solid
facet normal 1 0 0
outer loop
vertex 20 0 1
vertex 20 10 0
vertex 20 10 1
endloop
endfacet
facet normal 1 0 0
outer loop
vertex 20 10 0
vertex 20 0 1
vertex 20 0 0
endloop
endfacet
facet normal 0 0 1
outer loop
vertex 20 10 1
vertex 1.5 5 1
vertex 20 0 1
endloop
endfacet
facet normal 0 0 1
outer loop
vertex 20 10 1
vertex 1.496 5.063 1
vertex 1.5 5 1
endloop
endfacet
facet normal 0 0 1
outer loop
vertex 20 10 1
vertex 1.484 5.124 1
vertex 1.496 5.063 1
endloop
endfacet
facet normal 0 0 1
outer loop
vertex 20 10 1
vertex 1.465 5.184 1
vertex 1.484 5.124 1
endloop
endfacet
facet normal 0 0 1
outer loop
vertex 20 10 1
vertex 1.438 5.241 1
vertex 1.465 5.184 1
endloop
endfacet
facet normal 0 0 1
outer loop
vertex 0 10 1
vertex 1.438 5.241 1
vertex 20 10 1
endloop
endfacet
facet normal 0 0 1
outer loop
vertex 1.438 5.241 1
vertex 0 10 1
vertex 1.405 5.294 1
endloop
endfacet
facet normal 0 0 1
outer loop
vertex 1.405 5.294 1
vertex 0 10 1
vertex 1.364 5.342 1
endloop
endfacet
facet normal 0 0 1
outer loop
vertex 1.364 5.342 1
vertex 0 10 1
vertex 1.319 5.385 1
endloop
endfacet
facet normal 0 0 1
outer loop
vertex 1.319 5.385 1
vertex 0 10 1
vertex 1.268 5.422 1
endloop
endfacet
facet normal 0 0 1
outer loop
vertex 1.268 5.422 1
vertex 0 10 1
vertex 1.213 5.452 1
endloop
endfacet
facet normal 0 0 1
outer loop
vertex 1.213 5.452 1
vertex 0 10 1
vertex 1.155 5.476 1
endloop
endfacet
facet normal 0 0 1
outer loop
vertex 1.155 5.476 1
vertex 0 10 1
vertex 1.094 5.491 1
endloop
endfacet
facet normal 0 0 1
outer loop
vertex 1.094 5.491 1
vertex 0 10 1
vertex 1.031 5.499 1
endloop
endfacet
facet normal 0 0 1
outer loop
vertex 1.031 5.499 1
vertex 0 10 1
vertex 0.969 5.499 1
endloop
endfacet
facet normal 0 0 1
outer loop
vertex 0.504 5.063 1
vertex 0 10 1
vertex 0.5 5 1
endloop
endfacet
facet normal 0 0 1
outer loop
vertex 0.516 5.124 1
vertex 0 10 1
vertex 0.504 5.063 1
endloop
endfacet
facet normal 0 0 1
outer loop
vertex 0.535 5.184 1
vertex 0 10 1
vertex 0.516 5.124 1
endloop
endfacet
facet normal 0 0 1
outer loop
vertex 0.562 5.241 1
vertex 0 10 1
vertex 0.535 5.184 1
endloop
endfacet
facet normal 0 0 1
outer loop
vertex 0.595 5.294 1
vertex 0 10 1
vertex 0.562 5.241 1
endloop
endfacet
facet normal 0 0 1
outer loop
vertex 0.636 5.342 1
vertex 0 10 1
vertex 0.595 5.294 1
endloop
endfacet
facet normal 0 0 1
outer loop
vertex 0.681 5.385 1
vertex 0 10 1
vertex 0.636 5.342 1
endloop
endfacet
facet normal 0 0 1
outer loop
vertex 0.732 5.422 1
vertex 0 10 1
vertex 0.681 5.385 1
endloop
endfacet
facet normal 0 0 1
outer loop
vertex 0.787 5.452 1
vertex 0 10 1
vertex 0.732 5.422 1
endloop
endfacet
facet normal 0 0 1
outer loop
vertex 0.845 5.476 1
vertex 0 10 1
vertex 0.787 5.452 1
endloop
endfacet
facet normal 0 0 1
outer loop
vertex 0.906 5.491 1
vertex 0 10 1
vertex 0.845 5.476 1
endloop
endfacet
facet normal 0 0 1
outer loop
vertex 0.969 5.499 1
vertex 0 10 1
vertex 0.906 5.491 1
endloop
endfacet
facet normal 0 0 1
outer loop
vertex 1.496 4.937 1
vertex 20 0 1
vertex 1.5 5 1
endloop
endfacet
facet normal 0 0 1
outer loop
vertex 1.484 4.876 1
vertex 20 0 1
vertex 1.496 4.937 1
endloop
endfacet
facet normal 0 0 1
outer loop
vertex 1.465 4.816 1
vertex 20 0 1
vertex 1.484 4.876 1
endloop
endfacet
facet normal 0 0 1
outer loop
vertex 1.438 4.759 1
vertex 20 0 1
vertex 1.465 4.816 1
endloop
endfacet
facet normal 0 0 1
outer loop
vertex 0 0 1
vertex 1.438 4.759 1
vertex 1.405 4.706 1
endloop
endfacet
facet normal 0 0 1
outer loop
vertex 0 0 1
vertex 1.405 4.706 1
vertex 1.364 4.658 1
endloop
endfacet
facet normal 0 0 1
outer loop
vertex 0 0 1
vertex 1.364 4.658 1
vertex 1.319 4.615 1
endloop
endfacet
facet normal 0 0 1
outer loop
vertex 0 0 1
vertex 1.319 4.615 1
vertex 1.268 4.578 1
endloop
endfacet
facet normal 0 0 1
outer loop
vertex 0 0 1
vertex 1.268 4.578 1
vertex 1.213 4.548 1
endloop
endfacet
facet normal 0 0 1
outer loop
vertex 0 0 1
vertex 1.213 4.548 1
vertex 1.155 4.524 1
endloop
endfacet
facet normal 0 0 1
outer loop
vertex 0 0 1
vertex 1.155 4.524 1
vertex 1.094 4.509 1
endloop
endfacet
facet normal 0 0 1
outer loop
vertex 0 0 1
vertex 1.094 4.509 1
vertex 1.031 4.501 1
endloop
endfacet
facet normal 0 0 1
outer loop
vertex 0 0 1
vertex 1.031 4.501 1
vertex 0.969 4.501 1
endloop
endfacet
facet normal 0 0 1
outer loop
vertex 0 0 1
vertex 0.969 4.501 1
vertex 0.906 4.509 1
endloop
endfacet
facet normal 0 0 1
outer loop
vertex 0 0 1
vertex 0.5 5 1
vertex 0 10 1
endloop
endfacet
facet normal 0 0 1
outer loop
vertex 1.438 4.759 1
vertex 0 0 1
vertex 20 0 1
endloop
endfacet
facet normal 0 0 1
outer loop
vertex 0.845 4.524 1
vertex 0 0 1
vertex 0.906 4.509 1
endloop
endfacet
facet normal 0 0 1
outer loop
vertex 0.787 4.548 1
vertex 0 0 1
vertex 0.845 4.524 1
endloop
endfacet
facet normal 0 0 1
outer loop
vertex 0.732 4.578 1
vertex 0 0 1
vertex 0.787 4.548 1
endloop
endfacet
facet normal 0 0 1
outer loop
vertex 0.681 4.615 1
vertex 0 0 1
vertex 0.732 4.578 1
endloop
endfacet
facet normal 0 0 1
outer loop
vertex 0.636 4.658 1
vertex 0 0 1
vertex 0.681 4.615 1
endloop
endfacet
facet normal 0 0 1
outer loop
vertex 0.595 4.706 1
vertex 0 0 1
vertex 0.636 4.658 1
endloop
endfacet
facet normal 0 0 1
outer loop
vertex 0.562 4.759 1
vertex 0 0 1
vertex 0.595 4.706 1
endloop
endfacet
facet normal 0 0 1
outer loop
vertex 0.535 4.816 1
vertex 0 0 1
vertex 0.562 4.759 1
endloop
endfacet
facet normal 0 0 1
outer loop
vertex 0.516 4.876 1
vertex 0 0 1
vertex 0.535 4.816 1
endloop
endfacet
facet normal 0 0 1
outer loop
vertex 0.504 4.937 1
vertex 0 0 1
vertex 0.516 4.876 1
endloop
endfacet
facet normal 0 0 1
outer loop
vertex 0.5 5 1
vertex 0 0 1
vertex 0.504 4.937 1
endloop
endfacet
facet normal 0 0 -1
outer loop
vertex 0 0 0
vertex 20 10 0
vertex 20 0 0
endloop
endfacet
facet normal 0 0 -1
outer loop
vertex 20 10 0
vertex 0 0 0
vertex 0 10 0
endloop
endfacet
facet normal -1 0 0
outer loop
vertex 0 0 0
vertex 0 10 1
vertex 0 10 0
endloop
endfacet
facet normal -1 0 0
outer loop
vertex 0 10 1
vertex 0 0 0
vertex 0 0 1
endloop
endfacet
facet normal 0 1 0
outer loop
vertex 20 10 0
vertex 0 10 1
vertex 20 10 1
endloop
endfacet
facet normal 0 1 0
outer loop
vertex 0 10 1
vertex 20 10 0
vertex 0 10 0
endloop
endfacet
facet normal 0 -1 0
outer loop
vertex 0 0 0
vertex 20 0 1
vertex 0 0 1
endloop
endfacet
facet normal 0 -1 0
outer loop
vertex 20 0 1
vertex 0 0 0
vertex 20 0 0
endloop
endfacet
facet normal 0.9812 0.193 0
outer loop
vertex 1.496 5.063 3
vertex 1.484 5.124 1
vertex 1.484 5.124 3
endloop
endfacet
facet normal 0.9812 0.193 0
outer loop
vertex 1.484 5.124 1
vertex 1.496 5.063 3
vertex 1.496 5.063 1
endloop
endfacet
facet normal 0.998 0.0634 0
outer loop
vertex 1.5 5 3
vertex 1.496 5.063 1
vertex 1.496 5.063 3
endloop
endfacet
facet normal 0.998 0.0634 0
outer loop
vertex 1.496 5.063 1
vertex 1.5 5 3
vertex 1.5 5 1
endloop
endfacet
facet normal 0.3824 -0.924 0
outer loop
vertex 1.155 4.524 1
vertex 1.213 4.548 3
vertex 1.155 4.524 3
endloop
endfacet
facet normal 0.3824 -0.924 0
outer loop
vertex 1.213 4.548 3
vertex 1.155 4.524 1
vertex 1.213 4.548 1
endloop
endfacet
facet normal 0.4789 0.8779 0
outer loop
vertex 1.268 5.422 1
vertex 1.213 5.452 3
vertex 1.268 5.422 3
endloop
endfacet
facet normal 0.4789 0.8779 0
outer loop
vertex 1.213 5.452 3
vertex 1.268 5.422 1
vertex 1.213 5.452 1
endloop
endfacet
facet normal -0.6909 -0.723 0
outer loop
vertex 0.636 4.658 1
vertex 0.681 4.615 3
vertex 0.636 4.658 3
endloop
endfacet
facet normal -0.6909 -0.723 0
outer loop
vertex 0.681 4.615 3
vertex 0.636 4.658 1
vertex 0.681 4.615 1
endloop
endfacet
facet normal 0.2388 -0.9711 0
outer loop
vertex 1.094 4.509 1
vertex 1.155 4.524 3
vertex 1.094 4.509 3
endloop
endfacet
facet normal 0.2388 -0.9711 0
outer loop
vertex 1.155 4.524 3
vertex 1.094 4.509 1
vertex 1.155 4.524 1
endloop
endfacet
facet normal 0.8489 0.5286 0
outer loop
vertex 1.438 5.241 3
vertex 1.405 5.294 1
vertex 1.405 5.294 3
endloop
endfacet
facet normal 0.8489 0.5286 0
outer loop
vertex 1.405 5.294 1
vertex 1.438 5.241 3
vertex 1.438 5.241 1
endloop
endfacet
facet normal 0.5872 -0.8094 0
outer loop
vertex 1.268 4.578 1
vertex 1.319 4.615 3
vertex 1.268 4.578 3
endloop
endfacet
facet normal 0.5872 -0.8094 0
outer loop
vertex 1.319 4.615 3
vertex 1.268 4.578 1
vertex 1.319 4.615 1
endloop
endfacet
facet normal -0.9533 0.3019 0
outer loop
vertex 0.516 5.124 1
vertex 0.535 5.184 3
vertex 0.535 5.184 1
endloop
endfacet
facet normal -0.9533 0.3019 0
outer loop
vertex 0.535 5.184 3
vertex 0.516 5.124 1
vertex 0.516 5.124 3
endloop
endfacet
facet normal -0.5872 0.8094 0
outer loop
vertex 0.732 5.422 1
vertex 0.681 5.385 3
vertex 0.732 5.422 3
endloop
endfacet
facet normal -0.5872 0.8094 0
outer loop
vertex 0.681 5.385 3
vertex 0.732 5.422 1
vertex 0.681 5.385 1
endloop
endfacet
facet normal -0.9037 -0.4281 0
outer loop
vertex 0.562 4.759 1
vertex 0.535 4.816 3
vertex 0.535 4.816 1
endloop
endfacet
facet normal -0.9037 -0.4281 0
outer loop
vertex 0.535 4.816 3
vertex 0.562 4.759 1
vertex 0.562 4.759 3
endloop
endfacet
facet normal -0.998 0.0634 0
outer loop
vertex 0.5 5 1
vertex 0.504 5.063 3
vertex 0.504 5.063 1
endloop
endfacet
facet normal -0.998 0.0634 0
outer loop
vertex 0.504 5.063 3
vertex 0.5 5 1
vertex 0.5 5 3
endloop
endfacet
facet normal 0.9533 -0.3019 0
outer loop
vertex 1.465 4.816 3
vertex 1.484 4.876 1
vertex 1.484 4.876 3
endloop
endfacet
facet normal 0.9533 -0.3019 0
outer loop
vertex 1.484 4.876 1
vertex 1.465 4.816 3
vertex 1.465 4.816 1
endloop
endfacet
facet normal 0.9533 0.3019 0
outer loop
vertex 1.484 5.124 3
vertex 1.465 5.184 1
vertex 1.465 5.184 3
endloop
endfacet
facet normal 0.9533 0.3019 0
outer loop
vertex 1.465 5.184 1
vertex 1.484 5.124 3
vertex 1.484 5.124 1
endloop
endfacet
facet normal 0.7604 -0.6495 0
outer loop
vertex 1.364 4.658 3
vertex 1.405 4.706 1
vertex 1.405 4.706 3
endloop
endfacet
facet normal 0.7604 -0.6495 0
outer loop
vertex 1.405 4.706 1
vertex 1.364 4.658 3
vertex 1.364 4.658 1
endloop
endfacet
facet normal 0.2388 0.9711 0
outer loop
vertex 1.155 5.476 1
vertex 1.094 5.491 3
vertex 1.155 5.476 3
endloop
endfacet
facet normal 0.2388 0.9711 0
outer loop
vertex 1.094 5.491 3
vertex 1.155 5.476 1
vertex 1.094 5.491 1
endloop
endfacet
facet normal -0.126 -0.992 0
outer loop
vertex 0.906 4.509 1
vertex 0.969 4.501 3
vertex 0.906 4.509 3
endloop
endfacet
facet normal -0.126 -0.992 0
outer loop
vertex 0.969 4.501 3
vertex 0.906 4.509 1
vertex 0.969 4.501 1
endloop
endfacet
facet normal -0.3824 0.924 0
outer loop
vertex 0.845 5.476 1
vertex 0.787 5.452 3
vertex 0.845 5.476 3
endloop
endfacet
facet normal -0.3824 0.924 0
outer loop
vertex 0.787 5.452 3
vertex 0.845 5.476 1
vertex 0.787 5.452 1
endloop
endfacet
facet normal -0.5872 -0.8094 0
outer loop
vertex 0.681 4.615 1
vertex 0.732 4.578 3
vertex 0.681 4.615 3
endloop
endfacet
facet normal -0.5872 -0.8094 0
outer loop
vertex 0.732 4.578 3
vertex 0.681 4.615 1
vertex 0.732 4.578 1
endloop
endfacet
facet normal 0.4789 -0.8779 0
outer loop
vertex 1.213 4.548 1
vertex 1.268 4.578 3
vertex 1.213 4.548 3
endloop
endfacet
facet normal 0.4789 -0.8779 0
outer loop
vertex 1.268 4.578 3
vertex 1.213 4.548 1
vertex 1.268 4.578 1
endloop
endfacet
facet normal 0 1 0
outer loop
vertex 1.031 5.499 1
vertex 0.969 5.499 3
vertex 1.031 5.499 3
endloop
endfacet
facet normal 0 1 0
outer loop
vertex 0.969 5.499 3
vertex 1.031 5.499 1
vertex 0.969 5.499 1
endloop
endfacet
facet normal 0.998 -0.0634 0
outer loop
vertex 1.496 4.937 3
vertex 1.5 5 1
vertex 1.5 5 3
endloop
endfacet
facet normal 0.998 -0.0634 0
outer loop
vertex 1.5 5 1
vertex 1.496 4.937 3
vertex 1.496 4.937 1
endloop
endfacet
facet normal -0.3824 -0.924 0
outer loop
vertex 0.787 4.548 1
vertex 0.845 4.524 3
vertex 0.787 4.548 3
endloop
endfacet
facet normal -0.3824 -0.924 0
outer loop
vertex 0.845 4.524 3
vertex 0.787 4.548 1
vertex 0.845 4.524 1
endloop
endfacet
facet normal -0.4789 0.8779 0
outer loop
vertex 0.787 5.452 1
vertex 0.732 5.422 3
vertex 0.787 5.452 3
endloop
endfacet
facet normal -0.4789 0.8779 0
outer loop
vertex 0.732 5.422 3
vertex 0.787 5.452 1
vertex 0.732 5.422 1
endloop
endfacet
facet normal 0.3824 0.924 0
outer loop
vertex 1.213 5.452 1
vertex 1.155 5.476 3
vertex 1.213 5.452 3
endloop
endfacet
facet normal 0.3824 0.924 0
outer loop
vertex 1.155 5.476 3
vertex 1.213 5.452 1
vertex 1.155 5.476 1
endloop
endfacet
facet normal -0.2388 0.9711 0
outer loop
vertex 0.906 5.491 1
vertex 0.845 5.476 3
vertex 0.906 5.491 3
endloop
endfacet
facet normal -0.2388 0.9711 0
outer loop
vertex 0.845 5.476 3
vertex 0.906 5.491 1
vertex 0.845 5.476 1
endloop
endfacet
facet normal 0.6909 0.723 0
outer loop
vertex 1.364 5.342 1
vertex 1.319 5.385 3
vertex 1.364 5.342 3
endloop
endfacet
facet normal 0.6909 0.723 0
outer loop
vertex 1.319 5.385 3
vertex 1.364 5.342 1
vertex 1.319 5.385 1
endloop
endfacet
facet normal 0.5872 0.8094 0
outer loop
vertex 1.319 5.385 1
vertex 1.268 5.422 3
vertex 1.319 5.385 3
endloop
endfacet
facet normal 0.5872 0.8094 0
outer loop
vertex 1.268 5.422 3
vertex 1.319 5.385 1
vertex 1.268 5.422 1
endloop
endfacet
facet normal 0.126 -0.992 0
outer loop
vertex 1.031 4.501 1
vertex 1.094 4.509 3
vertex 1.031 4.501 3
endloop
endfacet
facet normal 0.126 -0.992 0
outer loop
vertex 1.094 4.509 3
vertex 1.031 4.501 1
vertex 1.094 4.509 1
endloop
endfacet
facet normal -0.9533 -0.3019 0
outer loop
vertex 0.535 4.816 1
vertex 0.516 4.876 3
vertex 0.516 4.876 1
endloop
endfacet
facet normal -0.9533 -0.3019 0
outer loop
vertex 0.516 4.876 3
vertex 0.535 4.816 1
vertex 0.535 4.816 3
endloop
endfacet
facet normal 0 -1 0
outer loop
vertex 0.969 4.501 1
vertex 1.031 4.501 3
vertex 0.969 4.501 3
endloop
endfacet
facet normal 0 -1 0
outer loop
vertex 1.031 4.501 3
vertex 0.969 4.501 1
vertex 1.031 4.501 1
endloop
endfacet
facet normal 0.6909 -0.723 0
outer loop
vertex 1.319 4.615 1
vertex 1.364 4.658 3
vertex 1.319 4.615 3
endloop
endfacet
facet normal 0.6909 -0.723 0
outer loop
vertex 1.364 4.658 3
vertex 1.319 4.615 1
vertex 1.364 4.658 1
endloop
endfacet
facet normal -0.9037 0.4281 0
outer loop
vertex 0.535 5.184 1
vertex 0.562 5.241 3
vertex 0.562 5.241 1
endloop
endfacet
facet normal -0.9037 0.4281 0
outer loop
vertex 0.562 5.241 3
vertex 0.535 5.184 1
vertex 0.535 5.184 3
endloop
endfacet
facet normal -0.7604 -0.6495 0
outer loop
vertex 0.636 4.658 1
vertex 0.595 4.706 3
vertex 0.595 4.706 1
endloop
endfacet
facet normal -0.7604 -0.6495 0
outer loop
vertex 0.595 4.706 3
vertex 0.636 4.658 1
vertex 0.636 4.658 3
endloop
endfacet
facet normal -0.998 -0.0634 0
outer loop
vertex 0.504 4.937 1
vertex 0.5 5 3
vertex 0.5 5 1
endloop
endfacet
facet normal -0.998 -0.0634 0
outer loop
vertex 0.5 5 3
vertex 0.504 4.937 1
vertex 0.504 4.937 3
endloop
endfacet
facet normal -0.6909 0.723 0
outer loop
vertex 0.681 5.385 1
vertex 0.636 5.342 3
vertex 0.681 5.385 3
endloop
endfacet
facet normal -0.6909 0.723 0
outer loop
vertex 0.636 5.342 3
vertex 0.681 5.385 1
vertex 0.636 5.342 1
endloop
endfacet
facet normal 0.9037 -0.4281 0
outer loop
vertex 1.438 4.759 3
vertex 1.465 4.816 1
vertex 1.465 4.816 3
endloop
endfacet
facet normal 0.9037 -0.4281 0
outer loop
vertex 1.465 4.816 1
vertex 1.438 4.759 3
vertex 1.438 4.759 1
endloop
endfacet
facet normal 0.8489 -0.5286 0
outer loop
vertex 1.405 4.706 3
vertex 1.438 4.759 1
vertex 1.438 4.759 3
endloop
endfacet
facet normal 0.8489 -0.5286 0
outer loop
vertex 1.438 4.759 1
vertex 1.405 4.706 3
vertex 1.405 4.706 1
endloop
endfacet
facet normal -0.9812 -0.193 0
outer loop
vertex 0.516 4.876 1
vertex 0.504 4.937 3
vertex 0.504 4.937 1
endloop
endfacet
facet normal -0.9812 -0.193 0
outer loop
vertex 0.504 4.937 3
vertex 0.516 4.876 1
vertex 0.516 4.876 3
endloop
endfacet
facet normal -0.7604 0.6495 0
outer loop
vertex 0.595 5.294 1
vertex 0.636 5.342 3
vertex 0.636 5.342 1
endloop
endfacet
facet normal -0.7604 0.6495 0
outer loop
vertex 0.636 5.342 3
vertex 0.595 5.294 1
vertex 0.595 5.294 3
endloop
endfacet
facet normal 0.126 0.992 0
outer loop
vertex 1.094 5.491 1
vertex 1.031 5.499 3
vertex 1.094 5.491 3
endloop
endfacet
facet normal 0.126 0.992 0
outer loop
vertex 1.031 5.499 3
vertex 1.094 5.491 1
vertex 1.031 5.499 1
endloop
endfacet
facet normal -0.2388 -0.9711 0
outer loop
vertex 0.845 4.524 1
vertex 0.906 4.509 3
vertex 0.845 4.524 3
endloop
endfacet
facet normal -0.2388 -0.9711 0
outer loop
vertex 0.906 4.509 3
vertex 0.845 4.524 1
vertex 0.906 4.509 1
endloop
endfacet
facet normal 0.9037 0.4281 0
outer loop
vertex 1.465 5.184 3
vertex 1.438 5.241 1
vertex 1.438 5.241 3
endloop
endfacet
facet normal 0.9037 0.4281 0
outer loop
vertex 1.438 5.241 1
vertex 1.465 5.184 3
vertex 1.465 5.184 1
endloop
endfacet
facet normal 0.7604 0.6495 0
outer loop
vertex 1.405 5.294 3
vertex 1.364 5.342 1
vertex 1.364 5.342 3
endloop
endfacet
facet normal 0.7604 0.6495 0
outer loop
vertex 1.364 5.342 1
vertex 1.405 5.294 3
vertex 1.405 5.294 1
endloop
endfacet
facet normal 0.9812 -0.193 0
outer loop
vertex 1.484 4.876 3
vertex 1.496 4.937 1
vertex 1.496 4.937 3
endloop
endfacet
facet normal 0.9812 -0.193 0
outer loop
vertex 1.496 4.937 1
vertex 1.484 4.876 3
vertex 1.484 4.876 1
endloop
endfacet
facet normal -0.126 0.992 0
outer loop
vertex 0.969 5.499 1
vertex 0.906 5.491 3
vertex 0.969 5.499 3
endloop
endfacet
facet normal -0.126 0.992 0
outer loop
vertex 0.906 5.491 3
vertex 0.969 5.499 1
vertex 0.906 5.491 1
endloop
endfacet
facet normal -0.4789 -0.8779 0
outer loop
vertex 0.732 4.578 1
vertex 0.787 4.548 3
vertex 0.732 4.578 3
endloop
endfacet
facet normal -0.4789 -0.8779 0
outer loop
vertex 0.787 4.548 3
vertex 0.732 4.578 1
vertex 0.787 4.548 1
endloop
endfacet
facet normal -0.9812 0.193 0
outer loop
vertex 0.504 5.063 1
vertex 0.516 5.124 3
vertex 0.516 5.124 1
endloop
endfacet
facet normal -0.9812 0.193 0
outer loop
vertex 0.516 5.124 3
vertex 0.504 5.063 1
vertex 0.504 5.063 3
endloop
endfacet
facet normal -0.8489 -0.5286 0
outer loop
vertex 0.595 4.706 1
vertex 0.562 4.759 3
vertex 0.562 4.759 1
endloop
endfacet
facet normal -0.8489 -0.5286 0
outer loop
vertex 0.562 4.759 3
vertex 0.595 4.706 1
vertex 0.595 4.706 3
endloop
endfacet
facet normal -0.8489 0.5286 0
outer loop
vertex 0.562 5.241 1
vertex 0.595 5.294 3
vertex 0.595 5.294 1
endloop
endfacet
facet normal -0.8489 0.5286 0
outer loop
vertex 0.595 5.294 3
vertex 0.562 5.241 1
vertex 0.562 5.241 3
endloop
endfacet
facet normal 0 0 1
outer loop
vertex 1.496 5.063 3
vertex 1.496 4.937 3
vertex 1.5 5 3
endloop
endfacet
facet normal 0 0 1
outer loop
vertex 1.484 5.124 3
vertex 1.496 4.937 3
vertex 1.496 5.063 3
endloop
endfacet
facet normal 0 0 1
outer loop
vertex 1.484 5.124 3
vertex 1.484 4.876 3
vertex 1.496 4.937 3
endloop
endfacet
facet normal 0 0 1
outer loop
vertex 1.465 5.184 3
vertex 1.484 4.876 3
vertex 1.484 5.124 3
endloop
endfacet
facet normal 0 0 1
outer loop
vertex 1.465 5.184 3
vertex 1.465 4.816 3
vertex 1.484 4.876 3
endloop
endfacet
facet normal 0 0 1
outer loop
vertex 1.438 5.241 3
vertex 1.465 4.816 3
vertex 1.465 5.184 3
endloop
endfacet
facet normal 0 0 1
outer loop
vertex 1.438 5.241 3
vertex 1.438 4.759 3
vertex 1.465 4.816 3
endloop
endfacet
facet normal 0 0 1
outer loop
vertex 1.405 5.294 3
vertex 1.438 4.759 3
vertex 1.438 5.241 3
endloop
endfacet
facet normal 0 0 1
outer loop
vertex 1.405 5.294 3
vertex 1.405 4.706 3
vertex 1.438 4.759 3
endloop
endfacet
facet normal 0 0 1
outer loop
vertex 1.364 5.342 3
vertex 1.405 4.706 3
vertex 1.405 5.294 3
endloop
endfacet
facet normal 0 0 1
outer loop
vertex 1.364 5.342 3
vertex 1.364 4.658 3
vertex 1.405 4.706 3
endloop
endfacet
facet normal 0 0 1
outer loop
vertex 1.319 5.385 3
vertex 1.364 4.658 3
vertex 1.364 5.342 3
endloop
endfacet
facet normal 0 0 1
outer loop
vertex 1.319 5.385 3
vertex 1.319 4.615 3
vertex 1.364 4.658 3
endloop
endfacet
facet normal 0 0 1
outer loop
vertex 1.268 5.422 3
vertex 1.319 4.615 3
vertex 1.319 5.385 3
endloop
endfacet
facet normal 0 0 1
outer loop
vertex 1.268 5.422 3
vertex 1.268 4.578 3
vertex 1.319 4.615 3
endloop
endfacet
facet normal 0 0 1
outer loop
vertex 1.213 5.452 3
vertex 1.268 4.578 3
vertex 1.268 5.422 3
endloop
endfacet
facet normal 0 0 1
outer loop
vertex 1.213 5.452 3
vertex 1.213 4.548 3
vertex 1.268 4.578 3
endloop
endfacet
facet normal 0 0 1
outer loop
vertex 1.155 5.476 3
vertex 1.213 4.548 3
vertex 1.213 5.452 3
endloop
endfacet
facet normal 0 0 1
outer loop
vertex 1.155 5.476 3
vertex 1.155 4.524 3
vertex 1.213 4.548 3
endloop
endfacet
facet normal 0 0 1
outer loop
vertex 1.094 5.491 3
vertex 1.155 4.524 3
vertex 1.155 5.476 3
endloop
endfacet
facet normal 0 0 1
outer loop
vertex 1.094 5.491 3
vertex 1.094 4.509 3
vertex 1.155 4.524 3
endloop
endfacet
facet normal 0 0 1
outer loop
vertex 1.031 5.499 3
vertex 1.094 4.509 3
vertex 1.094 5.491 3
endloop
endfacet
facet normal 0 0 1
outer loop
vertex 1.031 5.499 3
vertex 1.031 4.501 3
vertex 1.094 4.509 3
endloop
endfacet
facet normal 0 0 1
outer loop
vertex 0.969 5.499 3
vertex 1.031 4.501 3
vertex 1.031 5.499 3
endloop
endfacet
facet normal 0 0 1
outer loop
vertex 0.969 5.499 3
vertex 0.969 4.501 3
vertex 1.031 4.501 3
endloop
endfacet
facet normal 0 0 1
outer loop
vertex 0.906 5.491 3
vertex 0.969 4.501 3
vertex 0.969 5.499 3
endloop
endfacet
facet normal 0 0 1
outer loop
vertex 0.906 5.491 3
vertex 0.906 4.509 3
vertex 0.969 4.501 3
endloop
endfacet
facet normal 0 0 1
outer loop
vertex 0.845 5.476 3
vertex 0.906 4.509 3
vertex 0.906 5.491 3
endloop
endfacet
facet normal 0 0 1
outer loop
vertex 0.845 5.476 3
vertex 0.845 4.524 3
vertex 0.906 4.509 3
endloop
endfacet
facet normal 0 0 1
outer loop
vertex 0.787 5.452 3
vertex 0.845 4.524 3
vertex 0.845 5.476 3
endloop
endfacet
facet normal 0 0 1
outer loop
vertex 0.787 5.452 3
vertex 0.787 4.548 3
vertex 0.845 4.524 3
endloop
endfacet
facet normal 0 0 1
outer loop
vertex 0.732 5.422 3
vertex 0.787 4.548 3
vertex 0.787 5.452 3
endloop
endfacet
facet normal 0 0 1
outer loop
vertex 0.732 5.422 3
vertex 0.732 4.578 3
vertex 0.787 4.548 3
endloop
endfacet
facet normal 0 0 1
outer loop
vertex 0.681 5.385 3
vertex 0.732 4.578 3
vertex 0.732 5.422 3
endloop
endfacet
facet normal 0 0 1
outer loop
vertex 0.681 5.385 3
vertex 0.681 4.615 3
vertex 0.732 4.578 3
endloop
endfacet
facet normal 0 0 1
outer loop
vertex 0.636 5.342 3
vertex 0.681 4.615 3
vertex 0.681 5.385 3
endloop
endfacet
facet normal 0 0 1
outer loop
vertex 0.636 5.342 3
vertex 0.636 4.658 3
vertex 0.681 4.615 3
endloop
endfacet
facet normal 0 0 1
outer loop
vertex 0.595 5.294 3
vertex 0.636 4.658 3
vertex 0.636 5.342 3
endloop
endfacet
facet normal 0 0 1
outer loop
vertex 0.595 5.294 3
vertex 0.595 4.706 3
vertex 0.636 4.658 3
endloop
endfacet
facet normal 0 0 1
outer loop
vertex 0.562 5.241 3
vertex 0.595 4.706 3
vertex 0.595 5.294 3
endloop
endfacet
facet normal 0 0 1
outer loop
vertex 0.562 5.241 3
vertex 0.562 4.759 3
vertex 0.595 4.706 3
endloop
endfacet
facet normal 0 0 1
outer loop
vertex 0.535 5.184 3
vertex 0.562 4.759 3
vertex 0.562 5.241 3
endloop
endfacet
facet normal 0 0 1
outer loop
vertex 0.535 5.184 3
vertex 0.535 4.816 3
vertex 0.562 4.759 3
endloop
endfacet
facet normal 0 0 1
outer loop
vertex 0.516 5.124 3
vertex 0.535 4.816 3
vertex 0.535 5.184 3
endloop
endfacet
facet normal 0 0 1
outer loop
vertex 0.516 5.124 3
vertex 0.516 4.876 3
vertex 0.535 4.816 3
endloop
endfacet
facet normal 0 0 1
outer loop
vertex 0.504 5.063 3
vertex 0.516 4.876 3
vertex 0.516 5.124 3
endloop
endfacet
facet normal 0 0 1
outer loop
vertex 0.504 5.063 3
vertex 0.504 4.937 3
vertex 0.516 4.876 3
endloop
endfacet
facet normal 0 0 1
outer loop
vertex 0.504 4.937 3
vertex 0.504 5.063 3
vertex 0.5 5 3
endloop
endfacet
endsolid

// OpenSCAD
module base()
{
	cube([20, 10, 1]);
	translate([1,5,1])
		cylinder(r=0.5, h=2, $fn=50);
}

module sway(){
	difference(){
		cylinder(r=1, h=1, $fn=50);
		cylinder(r=0.7, h=2, $fn=50);
	}
	translate([0.7, -0.5, 0])
		cube([15,1,1]);

	translate([15,-2.5,0])
		cube([3,5,1]);
}

base();
translate([1,5,1.5])
	rotate([0,0,50]) //can adjust
	%sway();
